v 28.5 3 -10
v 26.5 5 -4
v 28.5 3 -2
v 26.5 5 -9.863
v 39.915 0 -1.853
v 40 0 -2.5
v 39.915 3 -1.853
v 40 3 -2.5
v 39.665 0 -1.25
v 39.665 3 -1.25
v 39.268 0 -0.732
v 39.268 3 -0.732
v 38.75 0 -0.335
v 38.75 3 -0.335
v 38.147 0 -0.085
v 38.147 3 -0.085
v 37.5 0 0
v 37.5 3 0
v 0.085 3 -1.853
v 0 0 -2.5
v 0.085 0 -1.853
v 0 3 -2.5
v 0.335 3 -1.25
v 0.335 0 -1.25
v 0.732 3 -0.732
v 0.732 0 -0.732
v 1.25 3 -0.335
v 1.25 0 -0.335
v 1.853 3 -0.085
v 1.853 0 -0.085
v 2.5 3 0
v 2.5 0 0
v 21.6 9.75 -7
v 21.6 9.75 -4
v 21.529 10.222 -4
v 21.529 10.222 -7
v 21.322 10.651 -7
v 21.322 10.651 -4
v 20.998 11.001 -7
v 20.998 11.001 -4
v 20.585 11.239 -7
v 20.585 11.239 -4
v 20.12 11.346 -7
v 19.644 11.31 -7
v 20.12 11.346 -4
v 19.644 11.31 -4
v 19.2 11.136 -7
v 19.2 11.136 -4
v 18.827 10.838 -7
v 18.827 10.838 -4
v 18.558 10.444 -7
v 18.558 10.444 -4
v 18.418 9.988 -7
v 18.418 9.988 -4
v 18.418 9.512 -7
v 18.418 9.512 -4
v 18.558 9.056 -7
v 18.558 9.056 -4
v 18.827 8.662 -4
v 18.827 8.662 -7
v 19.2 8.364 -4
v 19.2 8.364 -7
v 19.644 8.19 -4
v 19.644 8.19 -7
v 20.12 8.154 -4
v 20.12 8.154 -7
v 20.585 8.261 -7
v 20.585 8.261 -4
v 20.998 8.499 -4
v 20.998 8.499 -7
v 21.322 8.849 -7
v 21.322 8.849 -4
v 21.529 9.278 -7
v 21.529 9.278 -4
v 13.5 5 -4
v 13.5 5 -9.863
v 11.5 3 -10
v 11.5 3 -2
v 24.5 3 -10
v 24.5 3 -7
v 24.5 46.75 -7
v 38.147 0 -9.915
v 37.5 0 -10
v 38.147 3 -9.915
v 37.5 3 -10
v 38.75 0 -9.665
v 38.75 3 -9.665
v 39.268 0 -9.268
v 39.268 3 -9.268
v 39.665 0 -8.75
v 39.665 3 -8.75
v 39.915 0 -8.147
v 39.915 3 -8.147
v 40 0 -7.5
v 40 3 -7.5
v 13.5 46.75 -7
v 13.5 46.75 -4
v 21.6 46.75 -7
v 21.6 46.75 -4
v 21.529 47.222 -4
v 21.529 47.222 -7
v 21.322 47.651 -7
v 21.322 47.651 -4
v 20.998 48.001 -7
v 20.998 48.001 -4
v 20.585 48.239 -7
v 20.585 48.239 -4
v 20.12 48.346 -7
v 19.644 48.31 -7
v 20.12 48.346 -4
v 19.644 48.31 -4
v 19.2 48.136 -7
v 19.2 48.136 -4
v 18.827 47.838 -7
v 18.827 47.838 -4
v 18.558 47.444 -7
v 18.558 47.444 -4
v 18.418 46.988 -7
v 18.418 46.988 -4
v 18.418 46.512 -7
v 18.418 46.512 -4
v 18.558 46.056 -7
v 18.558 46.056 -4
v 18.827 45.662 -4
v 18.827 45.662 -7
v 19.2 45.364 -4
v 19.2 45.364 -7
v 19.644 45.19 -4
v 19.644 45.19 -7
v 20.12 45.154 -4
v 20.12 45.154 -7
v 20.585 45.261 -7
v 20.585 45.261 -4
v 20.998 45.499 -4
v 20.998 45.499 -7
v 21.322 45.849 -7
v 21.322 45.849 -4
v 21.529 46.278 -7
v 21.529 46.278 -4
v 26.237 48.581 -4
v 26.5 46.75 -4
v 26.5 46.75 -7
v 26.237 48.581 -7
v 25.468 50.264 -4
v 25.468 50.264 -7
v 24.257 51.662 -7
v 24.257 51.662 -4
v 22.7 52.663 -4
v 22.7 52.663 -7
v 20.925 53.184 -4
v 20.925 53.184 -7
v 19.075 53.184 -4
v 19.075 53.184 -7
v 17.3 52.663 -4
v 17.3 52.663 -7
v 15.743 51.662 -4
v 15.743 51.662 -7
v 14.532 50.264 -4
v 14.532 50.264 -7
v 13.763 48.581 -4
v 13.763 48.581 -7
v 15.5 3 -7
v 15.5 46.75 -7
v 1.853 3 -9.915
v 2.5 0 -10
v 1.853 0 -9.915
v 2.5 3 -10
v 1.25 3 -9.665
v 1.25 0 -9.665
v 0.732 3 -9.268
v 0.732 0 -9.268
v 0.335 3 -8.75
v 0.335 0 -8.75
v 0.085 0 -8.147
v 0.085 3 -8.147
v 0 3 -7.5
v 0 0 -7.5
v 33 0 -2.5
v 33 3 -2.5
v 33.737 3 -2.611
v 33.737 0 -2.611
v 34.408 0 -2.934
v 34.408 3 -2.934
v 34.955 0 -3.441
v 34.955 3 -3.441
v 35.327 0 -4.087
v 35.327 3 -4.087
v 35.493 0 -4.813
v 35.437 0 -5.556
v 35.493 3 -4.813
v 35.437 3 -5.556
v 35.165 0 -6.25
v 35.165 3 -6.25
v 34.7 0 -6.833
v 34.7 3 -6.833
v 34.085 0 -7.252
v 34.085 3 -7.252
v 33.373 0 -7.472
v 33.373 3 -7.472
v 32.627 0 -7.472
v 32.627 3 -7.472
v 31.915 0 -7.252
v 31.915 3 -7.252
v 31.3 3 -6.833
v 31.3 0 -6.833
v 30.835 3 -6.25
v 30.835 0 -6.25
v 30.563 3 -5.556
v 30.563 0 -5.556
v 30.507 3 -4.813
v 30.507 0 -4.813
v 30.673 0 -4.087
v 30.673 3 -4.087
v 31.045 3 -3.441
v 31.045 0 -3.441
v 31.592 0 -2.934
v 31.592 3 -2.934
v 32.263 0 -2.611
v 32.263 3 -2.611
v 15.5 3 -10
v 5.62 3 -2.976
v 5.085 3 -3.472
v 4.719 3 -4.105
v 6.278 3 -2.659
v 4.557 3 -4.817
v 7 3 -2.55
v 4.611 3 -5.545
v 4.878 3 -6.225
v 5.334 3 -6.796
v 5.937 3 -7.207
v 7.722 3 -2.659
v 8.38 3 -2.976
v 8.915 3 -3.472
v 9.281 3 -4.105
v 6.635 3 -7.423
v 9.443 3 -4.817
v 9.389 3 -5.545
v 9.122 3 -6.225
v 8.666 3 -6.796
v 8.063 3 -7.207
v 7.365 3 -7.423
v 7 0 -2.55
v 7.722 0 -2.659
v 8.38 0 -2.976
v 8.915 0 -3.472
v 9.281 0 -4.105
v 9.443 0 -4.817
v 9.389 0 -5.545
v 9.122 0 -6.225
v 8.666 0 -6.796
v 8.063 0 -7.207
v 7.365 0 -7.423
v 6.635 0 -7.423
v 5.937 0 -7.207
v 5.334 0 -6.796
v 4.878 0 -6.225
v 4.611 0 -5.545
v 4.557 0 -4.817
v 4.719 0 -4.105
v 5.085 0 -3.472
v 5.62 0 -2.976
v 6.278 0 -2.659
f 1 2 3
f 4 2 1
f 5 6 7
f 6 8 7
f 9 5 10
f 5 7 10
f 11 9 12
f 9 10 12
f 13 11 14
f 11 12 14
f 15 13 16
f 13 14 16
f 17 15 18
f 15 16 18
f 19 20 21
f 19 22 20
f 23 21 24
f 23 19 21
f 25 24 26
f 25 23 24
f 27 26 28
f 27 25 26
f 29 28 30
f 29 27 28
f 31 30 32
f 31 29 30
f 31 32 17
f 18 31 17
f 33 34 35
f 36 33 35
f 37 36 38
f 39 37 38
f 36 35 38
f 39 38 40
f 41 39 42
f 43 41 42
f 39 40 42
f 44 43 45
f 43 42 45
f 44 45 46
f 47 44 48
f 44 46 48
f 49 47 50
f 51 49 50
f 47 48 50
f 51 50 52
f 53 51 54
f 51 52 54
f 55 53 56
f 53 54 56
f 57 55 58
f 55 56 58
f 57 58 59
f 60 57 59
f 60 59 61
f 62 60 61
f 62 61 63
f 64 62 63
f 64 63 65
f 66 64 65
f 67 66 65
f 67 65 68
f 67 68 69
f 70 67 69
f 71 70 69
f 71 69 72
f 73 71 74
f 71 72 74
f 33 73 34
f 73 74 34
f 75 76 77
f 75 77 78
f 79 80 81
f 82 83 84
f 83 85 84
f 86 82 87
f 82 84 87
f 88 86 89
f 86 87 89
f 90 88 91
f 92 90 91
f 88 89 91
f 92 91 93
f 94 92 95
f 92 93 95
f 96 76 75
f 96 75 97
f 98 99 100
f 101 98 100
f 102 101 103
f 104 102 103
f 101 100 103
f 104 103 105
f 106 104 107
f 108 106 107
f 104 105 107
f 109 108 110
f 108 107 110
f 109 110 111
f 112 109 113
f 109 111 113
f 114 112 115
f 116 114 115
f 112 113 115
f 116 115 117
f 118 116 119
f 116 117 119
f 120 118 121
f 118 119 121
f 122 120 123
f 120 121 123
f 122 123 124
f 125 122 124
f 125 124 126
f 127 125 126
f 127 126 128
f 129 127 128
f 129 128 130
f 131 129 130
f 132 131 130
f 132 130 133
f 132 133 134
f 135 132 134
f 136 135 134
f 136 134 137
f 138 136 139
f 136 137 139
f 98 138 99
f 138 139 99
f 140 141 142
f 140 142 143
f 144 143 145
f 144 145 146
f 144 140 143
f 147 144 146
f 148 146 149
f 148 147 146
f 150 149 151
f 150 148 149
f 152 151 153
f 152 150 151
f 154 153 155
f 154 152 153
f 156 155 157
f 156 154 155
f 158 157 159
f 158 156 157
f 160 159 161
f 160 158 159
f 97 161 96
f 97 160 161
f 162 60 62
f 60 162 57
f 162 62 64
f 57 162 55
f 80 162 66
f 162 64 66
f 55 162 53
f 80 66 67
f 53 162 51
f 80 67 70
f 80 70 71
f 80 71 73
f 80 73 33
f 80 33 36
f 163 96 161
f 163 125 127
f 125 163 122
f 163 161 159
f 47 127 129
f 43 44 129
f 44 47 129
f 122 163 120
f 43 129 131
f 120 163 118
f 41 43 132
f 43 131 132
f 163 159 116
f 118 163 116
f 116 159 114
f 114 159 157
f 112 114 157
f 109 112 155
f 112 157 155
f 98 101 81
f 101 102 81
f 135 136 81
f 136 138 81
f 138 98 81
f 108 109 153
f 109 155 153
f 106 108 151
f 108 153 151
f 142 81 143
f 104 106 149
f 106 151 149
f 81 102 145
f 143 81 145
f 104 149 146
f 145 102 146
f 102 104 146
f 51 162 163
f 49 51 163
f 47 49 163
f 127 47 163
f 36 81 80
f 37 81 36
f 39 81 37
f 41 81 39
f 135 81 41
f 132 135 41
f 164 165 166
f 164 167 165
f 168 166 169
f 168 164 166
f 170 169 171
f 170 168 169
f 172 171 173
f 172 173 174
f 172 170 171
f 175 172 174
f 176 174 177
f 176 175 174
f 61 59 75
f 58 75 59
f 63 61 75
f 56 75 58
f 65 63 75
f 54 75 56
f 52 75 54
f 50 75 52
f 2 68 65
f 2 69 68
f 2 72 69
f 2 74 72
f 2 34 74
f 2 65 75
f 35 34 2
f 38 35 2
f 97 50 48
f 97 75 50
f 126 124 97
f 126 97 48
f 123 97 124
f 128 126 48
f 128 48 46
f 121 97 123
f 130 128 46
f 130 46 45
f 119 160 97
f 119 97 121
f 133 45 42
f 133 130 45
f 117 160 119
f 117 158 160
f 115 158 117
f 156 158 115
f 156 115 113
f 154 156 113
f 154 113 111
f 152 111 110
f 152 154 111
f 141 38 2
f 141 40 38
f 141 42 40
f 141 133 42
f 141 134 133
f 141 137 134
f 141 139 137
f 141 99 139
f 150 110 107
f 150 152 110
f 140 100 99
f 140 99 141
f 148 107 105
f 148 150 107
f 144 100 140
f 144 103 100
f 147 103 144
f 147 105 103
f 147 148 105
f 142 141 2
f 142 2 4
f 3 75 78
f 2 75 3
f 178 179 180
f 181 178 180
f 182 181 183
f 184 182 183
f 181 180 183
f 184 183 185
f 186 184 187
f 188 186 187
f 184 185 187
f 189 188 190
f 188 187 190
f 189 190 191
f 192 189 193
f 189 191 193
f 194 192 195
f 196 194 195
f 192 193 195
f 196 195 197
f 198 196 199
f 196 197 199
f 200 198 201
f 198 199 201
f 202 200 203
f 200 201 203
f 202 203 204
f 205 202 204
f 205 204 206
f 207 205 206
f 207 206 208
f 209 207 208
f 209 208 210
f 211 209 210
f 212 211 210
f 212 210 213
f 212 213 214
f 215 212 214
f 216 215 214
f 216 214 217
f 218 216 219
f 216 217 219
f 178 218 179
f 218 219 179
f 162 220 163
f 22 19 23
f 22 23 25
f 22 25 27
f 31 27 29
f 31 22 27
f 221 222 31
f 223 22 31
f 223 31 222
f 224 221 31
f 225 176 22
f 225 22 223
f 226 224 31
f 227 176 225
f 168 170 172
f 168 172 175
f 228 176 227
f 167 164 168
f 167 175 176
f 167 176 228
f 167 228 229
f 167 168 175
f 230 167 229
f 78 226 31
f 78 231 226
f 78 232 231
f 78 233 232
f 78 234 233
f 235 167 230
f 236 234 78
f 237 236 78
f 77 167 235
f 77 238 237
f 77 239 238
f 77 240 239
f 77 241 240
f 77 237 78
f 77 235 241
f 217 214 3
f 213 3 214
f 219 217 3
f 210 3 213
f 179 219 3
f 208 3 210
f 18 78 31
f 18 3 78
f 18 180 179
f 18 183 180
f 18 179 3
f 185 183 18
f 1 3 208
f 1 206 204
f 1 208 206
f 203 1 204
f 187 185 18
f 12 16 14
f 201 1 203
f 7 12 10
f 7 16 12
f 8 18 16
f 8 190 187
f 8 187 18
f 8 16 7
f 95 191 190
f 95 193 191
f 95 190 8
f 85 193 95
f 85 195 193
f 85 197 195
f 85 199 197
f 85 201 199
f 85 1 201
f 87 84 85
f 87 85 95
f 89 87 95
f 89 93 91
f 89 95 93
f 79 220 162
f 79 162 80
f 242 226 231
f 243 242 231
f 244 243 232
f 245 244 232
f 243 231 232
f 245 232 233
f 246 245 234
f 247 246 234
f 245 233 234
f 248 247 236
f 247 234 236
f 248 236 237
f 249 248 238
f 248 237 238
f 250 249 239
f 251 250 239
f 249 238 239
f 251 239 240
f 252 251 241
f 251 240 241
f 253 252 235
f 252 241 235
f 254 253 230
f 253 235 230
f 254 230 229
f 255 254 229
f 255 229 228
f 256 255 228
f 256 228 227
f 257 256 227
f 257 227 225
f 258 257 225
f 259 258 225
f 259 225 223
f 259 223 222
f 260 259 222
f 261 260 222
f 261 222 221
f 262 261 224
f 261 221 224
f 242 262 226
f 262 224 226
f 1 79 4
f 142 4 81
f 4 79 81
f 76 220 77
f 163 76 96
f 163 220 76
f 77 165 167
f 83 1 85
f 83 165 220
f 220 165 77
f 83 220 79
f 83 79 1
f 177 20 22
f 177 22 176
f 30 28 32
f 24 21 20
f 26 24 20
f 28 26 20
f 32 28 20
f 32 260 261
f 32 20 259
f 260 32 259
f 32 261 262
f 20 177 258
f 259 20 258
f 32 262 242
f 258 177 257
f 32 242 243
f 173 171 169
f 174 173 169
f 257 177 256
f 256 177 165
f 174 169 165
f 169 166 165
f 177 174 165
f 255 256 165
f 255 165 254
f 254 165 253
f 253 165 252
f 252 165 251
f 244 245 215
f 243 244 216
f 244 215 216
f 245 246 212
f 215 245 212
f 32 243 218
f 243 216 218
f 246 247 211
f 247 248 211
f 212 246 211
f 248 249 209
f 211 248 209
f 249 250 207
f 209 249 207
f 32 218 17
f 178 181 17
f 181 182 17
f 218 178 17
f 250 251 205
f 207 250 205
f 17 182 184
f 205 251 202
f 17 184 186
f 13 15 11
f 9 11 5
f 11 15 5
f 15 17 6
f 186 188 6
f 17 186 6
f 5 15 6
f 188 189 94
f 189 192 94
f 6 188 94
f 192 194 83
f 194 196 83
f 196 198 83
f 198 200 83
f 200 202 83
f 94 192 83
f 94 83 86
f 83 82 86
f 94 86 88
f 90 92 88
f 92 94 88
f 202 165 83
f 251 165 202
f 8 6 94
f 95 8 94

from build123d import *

# Parameters (mm, degrees)
SKETCH_1_W          = 40
SKETCH_1_H          = 10
EXTRUDE_1_DEPTH     = 3
SKETCH_2_W          = 13
SKETCH_2_H          = 3
EXTRUDE_2_DEPTH     = 43.75
EXTRUDE_3_DEPTH     = 3
RIB_1_REACH         = 62.314
SKETCH_5_WALL_W     = 166.48129864
SKETCH_5_WALL_H     = 2
RIB_2_REACH         = 62.314
SKETCH_7_WALL_W     = 166.48129864
SKETCH_7_WALL_H     = 2
SKETCH_8_R          = 1.6
CUT_EXTRUDE_1_DEPTH = 3
FILLET_1_R          = 2.5
SKETCH_9_R          = 2.45
SKETCH_9_R_2        = 2.5
CUT_EXTRUDE_5_DEPTH = 3
CHAMFER_2_SIZE      = 2


with BuildPart() as part:
    # 草图1 → 凸台-拉伸1 (new body)
    with BuildSketch(Plane(origin=(0, 0, 0), x_dir=(1, 0, 0), z_dir=(0, 1, 0))):
        with Locations((20, 5)):
            Rectangle(SKETCH_1_W, SKETCH_1_H)
    extrude(amount=EXTRUDE_1_DEPTH)

    # 草图2 → 凸台-拉伸2 (add)
    with BuildSketch(Plane(origin=(0, 3, 0), x_dir=(1, 0, 0), z_dir=(0, 1, 0))):
        with Locations((20, 5.5)):
            Rectangle(SKETCH_2_W, SKETCH_2_H)
    extrude(amount=EXTRUDE_2_DEPTH)

    # 草图4 → 凸台-拉伸3 (add)
    with BuildSketch(Plane.XY.offset(-4)):
        with BuildLine():
            Line((13.5, 46.75), (26.5, 46.75))
            ThreePointArc((26.5, 46.75), (20, 53.25), (13.5, 46.75))
        make_face()
    extrude(amount=-EXTRUDE_3_DEPTH)

    # 草图5 wall → 筋1 (add, up to next)
    with BuildSketch(Plane(origin=(13.5, 24.875, -8.5), x_dir=(0, 0.997657238183, 0.068410782047), z_dir=(0, 0.068410782047, -0.997657238183)), mode=Mode.PRIVATE) as rib_1_sk1:
        with Locations((0, 1)):
            Rectangle(SKETCH_5_WALL_W, SKETCH_5_WALL_H)
    rib_1_tool1 = extrude(rib_1_sk1.sketch, amount=-RIB_1_REACH, mode=Mode.PRIVATE) - part.part
    add(rib_1_tool1.solids().sort_by_distance((13.5, 24.875, -8.5))[0])

    # 草图7 wall → 筋2 (add, up to next)
    with BuildSketch(Plane(origin=(26.5, 24.875, -8.5), x_dir=(0, -0.997657238183, -0.068410782047), z_dir=(0, 0.068410782047, -0.997657238183)), mode=Mode.PRIVATE) as rib_2_sk1:
        with Locations((0, 1)):
            Rectangle(SKETCH_7_WALL_W, SKETCH_7_WALL_H)
    rib_2_tool1 = extrude(rib_2_sk1.sketch, amount=-RIB_2_REACH, mode=Mode.PRIVATE) - part.part
    add(rib_2_tool1.solids().sort_by_distance((26.5, 24.875, -8.5))[0])

    # 草图8 → 切除-拉伸1 (cut)
    with BuildSketch(Plane.XY.offset(-4)):
        with Locations((20, 9.75)):
            Circle(SKETCH_8_R)
        with Locations((20, 46.75)):
            Circle(SKETCH_8_R)
    extrude(amount=-CUT_EXTRUDE_1_DEPTH, mode=Mode.SUBTRACT)

    # 圆角1
    fillet_1_edges = [part.edges().sort_by_distance(p)[0] for p in [
        (0, 1.5, -10),
        (40, 1.5, -10),
        (40, 1.5, 0),
        (0, 1.5, 0),
    ]]
    fillet(fillet_1_edges, radius=FILLET_1_R)

    # 草图9 → 切除-拉伸5 (cut)
    with BuildSketch(Plane(origin=(0, 3, 0), x_dir=(1, 0, 0), z_dir=(0, 1, 0))):
        with Locations((7, 5)):
            Circle(SKETCH_9_R)
        with Locations((33, 5)):
            Circle(SKETCH_9_R_2)
    extrude(amount=-CUT_EXTRUDE_5_DEPTH, mode=Mode.SUBTRACT)

    # 倒角2
    chamfer_2_edges = [part.edges().sort_by_distance(p)[0] for p in [
        (20, 3, -4),
        (26.5, 3, -7),
        (13.5, 3, -7),
    ]]
    chamfer(chamfer_2_edges, length=CHAMFER_2_SIZE)


solid = part.part
